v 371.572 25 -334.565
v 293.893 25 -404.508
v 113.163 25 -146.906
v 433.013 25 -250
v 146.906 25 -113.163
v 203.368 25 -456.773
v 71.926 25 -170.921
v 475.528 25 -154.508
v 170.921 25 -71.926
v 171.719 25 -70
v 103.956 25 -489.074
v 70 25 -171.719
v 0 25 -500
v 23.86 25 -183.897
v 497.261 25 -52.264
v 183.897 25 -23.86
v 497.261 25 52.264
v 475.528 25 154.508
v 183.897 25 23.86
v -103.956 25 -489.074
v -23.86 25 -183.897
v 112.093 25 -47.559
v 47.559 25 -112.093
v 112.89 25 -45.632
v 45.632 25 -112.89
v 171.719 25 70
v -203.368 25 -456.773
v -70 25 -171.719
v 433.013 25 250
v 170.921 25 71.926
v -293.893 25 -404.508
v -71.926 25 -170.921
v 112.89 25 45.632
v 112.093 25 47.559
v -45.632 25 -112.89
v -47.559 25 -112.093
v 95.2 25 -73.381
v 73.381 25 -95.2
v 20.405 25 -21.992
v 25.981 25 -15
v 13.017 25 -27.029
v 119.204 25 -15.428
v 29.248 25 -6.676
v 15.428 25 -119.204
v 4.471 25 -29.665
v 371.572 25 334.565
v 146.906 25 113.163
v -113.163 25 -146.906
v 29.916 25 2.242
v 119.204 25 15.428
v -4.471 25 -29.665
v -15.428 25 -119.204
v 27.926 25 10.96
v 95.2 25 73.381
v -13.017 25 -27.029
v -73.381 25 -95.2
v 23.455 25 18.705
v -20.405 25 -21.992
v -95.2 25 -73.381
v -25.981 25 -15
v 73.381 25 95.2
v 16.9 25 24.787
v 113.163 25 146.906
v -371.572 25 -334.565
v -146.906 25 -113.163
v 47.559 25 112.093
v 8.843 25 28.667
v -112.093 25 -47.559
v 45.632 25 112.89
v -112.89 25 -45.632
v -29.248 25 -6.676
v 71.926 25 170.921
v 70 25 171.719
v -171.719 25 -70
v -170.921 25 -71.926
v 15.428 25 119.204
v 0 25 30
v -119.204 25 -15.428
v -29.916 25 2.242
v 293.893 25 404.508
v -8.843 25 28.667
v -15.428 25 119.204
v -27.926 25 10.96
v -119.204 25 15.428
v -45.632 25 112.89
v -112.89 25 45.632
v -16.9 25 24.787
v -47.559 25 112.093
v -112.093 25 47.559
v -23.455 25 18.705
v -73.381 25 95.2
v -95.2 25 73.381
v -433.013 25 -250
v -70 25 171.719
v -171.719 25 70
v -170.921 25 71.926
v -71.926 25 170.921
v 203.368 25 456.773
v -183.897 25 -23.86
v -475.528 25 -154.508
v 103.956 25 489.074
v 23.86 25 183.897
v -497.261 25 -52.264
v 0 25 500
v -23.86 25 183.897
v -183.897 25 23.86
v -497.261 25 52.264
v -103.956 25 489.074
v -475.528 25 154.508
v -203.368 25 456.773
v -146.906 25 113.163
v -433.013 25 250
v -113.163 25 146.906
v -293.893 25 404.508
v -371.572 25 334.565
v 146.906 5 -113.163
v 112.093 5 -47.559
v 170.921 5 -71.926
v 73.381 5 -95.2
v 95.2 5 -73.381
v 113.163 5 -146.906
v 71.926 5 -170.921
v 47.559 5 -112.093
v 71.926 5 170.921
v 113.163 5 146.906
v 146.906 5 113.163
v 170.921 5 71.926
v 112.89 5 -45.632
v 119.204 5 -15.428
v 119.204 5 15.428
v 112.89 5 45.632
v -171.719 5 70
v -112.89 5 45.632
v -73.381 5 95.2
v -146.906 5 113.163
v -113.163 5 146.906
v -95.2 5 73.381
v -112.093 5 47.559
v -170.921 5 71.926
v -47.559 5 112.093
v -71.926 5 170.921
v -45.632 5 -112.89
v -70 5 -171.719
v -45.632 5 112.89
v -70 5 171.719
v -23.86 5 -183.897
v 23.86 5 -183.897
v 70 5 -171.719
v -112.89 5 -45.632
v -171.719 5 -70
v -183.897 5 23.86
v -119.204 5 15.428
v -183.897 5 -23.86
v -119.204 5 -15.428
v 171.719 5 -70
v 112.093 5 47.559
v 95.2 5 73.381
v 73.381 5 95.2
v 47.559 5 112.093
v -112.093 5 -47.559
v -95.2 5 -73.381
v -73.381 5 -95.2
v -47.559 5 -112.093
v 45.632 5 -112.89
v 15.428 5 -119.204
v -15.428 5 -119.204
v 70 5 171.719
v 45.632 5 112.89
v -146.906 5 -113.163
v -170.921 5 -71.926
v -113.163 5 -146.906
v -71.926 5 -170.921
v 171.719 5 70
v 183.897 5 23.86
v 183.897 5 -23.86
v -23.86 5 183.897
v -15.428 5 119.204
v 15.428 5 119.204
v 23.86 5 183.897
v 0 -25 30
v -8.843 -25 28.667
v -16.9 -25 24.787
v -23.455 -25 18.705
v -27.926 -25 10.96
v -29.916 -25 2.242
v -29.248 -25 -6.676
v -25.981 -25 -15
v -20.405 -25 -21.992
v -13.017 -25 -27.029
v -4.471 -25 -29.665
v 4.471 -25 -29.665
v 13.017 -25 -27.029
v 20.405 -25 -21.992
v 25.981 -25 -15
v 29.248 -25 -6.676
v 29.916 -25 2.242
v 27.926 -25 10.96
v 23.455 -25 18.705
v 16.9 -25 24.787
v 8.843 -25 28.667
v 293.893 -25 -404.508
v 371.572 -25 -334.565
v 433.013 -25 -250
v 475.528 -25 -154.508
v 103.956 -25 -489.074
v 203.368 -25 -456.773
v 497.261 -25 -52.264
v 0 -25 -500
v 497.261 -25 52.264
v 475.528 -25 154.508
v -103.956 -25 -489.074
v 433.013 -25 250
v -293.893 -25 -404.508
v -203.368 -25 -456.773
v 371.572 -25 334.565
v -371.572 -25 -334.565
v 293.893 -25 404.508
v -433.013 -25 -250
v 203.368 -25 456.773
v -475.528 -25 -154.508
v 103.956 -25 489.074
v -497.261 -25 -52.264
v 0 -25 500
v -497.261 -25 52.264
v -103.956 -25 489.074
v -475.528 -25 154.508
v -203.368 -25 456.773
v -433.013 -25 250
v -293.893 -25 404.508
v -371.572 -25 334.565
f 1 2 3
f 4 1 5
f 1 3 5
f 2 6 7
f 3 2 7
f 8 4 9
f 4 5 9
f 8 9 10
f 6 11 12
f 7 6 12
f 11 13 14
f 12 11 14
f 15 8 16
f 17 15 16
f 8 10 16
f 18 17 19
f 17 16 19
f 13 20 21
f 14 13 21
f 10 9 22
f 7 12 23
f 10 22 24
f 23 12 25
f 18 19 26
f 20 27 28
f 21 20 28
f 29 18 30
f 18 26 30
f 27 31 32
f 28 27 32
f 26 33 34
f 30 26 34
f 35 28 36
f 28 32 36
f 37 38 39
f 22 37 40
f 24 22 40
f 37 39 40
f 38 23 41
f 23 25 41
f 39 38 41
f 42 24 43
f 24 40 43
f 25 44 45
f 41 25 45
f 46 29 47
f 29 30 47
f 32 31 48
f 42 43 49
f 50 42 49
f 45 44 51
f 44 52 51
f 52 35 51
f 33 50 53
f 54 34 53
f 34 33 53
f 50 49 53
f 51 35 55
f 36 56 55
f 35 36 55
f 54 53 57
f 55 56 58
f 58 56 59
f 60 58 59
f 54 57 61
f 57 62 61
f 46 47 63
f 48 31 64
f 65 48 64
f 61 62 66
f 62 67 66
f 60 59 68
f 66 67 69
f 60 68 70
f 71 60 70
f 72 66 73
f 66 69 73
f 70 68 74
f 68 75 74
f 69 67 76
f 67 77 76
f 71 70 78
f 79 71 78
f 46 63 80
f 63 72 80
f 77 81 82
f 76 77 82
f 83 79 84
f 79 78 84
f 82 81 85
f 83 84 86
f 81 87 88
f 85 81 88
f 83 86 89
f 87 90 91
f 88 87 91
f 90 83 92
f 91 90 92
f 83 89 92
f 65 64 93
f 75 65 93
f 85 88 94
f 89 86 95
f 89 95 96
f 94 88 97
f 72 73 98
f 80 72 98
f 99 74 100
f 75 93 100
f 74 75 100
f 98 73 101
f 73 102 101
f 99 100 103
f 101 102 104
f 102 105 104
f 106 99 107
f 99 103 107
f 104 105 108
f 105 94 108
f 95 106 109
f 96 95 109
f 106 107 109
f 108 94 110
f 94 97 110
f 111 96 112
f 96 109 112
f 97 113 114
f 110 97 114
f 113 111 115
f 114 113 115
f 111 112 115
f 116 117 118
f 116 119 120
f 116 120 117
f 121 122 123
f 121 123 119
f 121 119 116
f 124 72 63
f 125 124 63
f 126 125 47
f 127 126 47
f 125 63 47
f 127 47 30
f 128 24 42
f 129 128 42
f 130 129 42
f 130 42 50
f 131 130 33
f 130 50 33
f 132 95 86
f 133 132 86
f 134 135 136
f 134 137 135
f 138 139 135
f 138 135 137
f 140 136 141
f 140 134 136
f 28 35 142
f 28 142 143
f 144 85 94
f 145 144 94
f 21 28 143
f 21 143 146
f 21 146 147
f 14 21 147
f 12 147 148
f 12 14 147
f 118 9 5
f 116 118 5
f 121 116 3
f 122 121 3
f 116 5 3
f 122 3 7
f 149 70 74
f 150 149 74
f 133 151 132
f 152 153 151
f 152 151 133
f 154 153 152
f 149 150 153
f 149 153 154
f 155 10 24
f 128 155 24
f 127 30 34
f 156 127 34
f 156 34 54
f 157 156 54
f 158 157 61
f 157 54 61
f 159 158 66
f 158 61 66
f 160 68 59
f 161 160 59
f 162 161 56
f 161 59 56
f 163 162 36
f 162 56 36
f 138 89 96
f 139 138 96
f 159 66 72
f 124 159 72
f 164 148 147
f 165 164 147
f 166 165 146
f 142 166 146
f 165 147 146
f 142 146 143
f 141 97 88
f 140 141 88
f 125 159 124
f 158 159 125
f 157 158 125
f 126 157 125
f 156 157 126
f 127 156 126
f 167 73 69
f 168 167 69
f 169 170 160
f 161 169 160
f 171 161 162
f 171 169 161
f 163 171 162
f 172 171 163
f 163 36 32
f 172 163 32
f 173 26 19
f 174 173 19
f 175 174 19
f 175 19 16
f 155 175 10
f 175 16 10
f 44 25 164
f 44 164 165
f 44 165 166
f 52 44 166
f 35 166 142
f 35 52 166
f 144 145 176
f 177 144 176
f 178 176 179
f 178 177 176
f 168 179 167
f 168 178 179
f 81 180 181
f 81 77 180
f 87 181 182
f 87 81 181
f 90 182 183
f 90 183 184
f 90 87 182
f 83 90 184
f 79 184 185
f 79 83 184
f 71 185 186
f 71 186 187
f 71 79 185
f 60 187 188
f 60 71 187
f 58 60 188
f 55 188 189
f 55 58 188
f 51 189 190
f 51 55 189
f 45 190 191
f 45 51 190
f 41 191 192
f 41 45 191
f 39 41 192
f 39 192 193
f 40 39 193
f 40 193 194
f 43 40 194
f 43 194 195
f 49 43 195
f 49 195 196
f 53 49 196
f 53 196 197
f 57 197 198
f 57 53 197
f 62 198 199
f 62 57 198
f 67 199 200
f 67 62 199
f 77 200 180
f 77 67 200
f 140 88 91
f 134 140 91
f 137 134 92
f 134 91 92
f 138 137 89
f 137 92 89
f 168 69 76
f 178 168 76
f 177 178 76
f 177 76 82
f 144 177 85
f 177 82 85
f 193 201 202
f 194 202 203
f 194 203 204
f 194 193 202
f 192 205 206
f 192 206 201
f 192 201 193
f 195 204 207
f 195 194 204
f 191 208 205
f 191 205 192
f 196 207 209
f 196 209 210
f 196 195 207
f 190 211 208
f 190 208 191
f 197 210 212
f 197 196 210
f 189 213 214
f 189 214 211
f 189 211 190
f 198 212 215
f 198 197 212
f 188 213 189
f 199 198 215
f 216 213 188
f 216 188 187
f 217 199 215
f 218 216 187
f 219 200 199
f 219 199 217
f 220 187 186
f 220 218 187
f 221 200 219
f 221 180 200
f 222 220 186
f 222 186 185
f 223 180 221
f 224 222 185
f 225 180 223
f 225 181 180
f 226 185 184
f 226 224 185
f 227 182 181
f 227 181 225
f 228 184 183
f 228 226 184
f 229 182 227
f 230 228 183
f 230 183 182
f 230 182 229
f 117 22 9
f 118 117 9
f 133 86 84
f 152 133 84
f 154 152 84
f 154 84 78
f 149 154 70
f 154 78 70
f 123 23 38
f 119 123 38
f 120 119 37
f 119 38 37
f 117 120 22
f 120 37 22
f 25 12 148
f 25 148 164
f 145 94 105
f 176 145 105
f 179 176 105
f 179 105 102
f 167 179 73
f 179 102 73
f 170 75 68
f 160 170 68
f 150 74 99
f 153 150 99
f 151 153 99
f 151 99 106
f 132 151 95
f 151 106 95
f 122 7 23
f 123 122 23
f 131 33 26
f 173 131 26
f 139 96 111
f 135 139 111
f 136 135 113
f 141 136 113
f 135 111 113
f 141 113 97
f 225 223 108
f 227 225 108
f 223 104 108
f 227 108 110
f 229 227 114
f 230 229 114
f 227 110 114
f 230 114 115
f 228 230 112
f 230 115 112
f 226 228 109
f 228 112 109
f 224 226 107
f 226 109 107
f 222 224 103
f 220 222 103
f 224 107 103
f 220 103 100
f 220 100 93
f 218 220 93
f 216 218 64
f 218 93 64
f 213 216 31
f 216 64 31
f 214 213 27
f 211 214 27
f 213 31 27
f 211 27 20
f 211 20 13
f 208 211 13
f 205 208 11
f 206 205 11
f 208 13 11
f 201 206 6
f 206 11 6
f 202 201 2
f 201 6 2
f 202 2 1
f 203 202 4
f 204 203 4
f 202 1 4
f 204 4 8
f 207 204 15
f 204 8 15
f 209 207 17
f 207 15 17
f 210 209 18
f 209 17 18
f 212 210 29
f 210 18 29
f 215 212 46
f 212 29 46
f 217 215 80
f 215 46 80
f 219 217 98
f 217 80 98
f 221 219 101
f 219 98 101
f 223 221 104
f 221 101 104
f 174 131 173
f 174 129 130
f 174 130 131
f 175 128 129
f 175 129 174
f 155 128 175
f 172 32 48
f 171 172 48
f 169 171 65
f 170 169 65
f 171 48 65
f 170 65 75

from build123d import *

# Parameters (mm, degrees)
SKETCH1_W          = 470
SKETCH1_H          = 50
CUT_EXTRUDE2_DEPTH = 20


with BuildPart() as part:
    # Sketch1 → Revolve1 (revolve)
    with BuildSketch(Plane(origin=(0, 0, 0), x_dir=(0, 0, -1), z_dir=(1, 0, 0))):
        with Locations((-265, 0)):
            Rectangle(SKETCH1_W, SKETCH1_H)
    revolve(axis=Axis((0, 285.555555556, 0), (0, -1, 0)))

    # Sketch3 → Cut-Extrude2 (cut)
    with BuildSketch(Plane(origin=(0, 25, 0), x_dir=(1, 0, 0), z_dir=(0, 1, 0))):
        with BuildLine():
            Line((-45.632403393, 112.890460705), (-70, 171.719042916))
            ThreePointArc((-70, 171.719042916), (0, 185.438479556), (70, 171.719042916))
            Line((70, 171.719042916), (45.632403393, 112.890460705))
            ThreePointArc((45.632403393, 112.890460705), (0, 120), (-45.632403393, 112.890460705))
        make_face()
        with BuildLine():
            Line((112.092592177, 47.558628415), (170.921174388, 71.926225022))
            ThreePointArc((170.921174388, 71.926225022), (131.124806387, 131.124806387), (71.926225022, 170.921174388))
            Line((71.926225022, 170.921174388), (47.558628415, 112.092592177))
            ThreePointArc((47.558628415, 112.092592177), (84.852813742, 84.852813742), (112.092592177, 47.558628415))
        make_face()
        with BuildLine():
            Line((112.890460705, -45.632403393), (171.719042916, -70))
            ThreePointArc((171.719042916, -70), (185.438479556, 0), (171.719042916, 70))
            Line((171.719042916, 70), (112.890460705, 45.632403393))
            ThreePointArc((112.890460705, 45.632403393), (120, 0), (112.890460705, -45.632403393))
        make_face()
        with BuildLine():
            Line((47.558628415, -112.092592177), (71.926225022, -170.921174388))
            ThreePointArc((71.926225022, -170.921174388), (131.124806387, -131.124806387), (170.921174388, -71.926225022))
            Line((170.921174388, -71.926225022), (112.092592177, -47.558628415))
            ThreePointArc((112.092592177, -47.558628415), (84.852813742, -84.852813742), (47.558628415, -112.092592177))
        make_face()
        with BuildLine():
            Line((-45.632403393, -112.890460705), (-70, -171.719042916))
            ThreePointArc((-70, -171.719042916), (0, -185.438479556), (70, -171.719042916))
            Line((70, -171.719042916), (45.632403393, -112.890460705))
            ThreePointArc((45.632403393, -112.890460705), (0, -120), (-45.632403393, -112.890460705))
        make_face()
        with BuildLine():
            Line((-112.092592177, -47.558628415), (-170.921174388, -71.926225022))
            ThreePointArc((-170.921174388, -71.926225022), (-131.124806387, -131.124806387), (-71.926225022, -170.921174388))
            Line((-71.926225022, -170.921174388), (-47.558628415, -112.092592177))
            ThreePointArc((-47.558628415, -112.092592177), (-84.852813742, -84.852813742), (-112.092592177, -47.558628415))
        make_face()
        with BuildLine():
            Line((-112.890460705, 45.632403393), (-171.719042916, 70))
            ThreePointArc((-171.719042916, 70), (-185.438479556, 0), (-171.719042916, -70))
            Line((-171.719042916, -70), (-112.890460705, -45.632403393))
            ThreePointArc((-112.890460705, -45.632403393), (-120, 0), (-112.890460705, 45.632403393))
        make_face()
        with BuildLine():
            Line((-47.558628415, 112.092592177), (-71.926225022, 170.921174388))
            ThreePointArc((-71.926225022, 170.921174388), (-131.124806387, 131.124806387), (-170.921174388, 71.926225022))
            Line((-170.921174388, 71.926225022), (-112.092592177, 47.558628415))
            ThreePointArc((-112.092592177, 47.558628415), (-84.852813742, 84.852813742), (-47.558628415, 112.092592177))
        make_face()
    extrude(amount=-CUT_EXTRUDE2_DEPTH, mode=Mode.SUBTRACT)


solid = part.part
